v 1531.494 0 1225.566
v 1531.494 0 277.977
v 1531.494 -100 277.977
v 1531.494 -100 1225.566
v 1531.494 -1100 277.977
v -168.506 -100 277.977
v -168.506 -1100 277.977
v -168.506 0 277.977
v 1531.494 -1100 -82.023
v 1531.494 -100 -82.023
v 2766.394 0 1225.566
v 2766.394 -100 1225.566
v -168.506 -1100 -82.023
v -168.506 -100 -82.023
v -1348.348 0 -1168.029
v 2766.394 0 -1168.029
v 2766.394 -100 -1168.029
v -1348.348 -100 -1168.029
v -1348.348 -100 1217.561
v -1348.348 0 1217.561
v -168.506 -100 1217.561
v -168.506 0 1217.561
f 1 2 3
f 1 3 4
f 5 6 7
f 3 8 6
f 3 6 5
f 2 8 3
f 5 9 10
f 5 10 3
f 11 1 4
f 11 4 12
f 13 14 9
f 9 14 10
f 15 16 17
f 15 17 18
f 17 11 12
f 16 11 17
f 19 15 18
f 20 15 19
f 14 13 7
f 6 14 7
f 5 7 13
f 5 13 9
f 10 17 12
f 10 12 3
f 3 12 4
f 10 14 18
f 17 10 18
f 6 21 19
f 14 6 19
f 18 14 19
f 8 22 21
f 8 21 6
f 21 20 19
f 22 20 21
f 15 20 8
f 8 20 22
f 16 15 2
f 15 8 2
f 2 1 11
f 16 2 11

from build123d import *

# Parameters (mm, degrees)
F0_W     = 1700
F0_H     = 360
F1_DEPTH = 1100
F3_DEPTH = 100


with BuildPart() as f1:
    # F0 (on Front) → F1 (new body)
    with BuildSketch(Plane.XZ):
        with Locations((681.494432, 97.976522)):
            Rectangle(F0_W, F0_H)
    extrude(amount=F1_DEPTH)

    # F2 (on face) → F3 (join)
    with BuildSketch(Plane(origin=(0, 0, 0), x_dir=(-1, 0, 0), z_dir=(0, 1, 0))):
        Polygon((168.505568, 277.976522), (-1531.494432, 277.976522), (-1531.494432, 1225.566149), (-2766.393661, 1225.566149), (-2766.393661, 277.976522), (-2766.393661, -82.023478), (-2766.393661, -1168.028712), (1348.348022, -1168.028712), (1348.348022, -82.023478), (1348.348022, 277.976522), (1348.348022, 1217.560768), (168.505568, 1217.560768), align=None)
    extrude(amount=-F3_DEPTH)


solid = f1.part
